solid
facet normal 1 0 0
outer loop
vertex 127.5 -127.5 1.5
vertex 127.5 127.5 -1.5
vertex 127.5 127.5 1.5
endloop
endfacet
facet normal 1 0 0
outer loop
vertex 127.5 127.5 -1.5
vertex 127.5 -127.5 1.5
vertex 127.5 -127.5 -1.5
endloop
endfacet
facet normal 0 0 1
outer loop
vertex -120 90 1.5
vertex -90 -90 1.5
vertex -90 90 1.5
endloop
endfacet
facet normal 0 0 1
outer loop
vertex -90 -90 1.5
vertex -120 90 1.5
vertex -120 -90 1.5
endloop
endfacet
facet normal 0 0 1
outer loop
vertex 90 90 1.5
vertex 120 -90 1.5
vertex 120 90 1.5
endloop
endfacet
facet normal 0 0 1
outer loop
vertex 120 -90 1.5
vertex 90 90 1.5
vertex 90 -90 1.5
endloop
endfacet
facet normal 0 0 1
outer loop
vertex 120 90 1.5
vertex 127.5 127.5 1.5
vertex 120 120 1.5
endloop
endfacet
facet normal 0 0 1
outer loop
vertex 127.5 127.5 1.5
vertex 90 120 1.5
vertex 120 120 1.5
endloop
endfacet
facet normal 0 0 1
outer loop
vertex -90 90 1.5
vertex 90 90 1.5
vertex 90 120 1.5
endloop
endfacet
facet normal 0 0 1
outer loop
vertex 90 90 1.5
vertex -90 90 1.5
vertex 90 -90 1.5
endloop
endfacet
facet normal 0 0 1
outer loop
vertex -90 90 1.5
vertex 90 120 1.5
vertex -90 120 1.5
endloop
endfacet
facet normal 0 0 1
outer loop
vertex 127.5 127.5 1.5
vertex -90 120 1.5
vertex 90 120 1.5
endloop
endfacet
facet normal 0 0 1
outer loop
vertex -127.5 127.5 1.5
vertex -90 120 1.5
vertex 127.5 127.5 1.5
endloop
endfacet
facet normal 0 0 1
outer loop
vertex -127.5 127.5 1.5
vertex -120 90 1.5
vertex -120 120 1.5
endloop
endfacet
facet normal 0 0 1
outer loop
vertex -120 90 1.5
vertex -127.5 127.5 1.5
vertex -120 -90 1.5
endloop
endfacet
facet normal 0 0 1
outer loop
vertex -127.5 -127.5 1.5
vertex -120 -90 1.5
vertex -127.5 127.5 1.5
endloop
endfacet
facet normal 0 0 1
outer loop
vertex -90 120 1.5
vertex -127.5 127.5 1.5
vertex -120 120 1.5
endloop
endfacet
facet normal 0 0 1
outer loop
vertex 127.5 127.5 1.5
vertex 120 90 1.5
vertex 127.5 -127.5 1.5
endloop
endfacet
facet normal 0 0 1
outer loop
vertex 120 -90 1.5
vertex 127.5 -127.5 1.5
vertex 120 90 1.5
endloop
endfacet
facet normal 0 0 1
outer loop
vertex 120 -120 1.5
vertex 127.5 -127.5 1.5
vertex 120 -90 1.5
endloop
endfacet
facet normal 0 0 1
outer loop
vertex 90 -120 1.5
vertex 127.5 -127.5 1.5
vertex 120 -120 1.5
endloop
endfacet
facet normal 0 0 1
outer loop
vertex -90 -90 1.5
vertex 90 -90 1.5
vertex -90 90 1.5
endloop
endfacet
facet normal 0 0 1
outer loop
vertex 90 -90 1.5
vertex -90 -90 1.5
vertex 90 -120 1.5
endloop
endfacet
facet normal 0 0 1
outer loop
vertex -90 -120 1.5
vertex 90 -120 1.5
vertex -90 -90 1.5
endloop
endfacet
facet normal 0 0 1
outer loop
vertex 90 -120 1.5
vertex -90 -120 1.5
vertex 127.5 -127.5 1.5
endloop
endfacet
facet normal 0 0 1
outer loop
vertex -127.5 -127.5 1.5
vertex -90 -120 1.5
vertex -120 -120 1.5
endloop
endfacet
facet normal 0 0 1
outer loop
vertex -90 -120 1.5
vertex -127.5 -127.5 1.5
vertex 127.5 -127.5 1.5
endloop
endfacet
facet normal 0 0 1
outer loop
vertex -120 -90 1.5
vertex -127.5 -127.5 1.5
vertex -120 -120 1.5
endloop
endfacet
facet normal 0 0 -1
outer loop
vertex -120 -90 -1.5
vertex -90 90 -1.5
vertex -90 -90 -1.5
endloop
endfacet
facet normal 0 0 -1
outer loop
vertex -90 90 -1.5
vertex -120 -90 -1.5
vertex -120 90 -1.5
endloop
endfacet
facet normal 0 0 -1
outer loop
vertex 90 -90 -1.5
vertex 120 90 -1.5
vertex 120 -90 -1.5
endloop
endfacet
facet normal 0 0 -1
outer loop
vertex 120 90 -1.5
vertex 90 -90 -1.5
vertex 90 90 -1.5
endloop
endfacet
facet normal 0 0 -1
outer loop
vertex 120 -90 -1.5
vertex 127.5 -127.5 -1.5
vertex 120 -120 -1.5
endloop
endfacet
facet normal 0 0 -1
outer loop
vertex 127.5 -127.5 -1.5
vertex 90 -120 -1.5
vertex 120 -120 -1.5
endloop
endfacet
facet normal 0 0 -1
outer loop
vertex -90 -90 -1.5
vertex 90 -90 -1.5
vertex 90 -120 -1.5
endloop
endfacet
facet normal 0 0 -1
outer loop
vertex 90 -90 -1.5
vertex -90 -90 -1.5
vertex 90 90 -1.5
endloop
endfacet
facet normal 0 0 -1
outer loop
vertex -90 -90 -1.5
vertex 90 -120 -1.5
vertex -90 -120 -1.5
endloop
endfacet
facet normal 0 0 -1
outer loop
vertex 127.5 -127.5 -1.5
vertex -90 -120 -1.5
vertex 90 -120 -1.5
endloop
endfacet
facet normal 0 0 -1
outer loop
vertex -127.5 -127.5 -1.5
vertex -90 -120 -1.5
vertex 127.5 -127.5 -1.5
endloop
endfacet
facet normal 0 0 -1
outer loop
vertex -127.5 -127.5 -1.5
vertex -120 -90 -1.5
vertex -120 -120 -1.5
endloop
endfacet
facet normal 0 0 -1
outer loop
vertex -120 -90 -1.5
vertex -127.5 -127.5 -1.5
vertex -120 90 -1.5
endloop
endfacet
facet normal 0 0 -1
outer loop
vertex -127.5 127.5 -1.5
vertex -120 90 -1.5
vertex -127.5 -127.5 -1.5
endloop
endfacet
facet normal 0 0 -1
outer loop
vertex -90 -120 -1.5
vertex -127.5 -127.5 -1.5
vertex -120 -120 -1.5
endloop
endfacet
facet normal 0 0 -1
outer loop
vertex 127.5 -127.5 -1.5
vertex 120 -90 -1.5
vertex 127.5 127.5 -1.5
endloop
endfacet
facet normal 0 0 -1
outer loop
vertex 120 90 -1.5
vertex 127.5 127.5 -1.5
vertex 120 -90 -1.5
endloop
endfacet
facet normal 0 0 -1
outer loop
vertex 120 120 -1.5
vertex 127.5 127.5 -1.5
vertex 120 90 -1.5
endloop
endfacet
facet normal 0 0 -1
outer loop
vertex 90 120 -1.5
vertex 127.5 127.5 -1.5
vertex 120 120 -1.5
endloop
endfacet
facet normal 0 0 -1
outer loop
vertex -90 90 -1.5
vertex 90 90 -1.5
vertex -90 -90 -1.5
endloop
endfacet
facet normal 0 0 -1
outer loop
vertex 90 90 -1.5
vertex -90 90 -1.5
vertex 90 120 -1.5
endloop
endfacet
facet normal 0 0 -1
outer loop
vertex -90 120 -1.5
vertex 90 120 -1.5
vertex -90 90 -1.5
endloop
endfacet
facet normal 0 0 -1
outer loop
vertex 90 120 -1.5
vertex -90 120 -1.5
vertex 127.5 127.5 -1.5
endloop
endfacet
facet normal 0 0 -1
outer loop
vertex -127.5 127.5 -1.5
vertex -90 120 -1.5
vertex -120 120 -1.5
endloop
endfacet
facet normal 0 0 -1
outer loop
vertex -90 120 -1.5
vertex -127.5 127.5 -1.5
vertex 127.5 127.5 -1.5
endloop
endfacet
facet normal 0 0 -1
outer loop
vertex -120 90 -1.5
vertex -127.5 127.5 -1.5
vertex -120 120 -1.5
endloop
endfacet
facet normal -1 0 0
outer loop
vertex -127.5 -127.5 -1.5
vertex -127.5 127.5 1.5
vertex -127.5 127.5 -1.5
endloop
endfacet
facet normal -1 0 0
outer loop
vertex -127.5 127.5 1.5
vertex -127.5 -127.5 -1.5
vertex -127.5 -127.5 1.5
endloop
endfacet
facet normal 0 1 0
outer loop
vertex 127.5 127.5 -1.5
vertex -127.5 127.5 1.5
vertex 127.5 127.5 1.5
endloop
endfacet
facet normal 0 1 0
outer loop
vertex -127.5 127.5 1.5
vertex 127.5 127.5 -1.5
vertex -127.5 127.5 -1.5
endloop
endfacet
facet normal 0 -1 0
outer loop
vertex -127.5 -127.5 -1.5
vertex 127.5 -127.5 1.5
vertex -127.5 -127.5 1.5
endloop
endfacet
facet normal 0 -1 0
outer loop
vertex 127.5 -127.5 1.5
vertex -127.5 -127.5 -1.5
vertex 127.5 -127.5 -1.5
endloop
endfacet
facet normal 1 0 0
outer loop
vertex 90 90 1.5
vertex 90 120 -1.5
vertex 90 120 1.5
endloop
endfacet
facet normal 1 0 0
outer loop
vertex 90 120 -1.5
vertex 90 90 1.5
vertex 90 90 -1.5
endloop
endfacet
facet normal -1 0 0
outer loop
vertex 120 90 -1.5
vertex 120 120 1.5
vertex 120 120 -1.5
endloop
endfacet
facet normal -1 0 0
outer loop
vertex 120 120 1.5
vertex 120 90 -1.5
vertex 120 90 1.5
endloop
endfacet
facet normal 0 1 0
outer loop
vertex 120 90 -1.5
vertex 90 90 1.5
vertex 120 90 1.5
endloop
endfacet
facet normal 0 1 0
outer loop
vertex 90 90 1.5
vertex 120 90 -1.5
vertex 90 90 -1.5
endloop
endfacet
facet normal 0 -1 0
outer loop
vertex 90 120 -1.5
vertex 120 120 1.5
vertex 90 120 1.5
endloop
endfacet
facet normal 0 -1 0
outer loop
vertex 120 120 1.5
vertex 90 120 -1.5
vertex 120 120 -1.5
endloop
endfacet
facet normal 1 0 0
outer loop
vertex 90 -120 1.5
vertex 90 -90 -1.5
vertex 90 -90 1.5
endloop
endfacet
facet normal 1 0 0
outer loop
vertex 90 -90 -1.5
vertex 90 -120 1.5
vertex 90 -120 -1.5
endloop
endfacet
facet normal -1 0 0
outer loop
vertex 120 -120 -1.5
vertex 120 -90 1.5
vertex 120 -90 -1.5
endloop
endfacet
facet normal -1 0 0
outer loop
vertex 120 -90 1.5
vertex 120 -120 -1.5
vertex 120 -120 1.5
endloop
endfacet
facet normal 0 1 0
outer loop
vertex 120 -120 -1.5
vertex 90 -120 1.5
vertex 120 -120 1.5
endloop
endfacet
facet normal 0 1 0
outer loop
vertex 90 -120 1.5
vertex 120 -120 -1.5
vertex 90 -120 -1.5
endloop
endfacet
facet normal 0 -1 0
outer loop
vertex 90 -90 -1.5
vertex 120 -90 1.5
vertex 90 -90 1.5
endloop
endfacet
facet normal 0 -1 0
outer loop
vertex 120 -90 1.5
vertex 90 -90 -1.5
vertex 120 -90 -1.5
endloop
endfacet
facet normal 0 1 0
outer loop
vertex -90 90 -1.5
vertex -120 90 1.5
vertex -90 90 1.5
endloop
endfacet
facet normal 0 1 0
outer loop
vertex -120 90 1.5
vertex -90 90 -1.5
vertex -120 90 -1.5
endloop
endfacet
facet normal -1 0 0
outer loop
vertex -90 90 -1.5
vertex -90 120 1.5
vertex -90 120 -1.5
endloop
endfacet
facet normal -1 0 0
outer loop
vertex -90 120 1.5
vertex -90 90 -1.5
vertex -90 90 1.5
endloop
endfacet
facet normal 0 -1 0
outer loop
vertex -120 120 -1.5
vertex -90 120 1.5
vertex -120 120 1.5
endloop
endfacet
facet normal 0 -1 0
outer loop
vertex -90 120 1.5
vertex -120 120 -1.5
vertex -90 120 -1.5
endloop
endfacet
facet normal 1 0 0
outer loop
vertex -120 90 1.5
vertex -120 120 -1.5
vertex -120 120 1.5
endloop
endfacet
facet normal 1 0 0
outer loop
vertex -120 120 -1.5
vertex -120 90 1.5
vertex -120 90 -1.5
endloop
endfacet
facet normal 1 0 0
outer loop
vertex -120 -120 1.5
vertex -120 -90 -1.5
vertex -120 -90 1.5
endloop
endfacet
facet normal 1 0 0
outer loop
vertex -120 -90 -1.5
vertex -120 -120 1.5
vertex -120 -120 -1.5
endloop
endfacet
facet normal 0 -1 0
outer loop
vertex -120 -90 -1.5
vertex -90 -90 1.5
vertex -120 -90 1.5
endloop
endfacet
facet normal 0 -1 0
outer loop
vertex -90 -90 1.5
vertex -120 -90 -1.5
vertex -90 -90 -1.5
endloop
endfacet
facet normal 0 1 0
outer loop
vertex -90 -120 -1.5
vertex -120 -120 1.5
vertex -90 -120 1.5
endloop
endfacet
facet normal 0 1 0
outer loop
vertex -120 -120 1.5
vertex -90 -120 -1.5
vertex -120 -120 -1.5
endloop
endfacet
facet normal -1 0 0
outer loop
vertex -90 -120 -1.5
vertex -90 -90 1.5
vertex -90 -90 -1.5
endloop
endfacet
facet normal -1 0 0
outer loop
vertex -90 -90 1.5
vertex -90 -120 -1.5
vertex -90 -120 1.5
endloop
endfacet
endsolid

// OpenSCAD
units2 = 6;
length_in_units2 = 6;
module arm(length_in_units2){
translate([30*(units2+2)/2-15,0,0]) cube([30,30*(length_in_units2+2),30], center=true);
}


// add a fan to this


module bottom_frame() {
	difference(){
		cube([30*(units2+2.5),30*(units2+2.5),3], center=true);
		
		translate([0,(units2-2.5)*30,(units2-3)*30]) rotate([90,0,0]) arm(length_in_units2);
		translate([0,-(units2-2.5)*30,(units2-3)*30]) rotate([90,0,0]) arm(length_in_units2);
		translate([0,(units2-2.5)*30,(units2-3)*30]) rotate([90,180,0]) arm(length_in_units2);
		translate([0,-(units2-2.5)*30,((length_in_units2-3)*30)]) rotate([90,0,180]) arm(length_in_units2);
	}
}

bottom_frame();
